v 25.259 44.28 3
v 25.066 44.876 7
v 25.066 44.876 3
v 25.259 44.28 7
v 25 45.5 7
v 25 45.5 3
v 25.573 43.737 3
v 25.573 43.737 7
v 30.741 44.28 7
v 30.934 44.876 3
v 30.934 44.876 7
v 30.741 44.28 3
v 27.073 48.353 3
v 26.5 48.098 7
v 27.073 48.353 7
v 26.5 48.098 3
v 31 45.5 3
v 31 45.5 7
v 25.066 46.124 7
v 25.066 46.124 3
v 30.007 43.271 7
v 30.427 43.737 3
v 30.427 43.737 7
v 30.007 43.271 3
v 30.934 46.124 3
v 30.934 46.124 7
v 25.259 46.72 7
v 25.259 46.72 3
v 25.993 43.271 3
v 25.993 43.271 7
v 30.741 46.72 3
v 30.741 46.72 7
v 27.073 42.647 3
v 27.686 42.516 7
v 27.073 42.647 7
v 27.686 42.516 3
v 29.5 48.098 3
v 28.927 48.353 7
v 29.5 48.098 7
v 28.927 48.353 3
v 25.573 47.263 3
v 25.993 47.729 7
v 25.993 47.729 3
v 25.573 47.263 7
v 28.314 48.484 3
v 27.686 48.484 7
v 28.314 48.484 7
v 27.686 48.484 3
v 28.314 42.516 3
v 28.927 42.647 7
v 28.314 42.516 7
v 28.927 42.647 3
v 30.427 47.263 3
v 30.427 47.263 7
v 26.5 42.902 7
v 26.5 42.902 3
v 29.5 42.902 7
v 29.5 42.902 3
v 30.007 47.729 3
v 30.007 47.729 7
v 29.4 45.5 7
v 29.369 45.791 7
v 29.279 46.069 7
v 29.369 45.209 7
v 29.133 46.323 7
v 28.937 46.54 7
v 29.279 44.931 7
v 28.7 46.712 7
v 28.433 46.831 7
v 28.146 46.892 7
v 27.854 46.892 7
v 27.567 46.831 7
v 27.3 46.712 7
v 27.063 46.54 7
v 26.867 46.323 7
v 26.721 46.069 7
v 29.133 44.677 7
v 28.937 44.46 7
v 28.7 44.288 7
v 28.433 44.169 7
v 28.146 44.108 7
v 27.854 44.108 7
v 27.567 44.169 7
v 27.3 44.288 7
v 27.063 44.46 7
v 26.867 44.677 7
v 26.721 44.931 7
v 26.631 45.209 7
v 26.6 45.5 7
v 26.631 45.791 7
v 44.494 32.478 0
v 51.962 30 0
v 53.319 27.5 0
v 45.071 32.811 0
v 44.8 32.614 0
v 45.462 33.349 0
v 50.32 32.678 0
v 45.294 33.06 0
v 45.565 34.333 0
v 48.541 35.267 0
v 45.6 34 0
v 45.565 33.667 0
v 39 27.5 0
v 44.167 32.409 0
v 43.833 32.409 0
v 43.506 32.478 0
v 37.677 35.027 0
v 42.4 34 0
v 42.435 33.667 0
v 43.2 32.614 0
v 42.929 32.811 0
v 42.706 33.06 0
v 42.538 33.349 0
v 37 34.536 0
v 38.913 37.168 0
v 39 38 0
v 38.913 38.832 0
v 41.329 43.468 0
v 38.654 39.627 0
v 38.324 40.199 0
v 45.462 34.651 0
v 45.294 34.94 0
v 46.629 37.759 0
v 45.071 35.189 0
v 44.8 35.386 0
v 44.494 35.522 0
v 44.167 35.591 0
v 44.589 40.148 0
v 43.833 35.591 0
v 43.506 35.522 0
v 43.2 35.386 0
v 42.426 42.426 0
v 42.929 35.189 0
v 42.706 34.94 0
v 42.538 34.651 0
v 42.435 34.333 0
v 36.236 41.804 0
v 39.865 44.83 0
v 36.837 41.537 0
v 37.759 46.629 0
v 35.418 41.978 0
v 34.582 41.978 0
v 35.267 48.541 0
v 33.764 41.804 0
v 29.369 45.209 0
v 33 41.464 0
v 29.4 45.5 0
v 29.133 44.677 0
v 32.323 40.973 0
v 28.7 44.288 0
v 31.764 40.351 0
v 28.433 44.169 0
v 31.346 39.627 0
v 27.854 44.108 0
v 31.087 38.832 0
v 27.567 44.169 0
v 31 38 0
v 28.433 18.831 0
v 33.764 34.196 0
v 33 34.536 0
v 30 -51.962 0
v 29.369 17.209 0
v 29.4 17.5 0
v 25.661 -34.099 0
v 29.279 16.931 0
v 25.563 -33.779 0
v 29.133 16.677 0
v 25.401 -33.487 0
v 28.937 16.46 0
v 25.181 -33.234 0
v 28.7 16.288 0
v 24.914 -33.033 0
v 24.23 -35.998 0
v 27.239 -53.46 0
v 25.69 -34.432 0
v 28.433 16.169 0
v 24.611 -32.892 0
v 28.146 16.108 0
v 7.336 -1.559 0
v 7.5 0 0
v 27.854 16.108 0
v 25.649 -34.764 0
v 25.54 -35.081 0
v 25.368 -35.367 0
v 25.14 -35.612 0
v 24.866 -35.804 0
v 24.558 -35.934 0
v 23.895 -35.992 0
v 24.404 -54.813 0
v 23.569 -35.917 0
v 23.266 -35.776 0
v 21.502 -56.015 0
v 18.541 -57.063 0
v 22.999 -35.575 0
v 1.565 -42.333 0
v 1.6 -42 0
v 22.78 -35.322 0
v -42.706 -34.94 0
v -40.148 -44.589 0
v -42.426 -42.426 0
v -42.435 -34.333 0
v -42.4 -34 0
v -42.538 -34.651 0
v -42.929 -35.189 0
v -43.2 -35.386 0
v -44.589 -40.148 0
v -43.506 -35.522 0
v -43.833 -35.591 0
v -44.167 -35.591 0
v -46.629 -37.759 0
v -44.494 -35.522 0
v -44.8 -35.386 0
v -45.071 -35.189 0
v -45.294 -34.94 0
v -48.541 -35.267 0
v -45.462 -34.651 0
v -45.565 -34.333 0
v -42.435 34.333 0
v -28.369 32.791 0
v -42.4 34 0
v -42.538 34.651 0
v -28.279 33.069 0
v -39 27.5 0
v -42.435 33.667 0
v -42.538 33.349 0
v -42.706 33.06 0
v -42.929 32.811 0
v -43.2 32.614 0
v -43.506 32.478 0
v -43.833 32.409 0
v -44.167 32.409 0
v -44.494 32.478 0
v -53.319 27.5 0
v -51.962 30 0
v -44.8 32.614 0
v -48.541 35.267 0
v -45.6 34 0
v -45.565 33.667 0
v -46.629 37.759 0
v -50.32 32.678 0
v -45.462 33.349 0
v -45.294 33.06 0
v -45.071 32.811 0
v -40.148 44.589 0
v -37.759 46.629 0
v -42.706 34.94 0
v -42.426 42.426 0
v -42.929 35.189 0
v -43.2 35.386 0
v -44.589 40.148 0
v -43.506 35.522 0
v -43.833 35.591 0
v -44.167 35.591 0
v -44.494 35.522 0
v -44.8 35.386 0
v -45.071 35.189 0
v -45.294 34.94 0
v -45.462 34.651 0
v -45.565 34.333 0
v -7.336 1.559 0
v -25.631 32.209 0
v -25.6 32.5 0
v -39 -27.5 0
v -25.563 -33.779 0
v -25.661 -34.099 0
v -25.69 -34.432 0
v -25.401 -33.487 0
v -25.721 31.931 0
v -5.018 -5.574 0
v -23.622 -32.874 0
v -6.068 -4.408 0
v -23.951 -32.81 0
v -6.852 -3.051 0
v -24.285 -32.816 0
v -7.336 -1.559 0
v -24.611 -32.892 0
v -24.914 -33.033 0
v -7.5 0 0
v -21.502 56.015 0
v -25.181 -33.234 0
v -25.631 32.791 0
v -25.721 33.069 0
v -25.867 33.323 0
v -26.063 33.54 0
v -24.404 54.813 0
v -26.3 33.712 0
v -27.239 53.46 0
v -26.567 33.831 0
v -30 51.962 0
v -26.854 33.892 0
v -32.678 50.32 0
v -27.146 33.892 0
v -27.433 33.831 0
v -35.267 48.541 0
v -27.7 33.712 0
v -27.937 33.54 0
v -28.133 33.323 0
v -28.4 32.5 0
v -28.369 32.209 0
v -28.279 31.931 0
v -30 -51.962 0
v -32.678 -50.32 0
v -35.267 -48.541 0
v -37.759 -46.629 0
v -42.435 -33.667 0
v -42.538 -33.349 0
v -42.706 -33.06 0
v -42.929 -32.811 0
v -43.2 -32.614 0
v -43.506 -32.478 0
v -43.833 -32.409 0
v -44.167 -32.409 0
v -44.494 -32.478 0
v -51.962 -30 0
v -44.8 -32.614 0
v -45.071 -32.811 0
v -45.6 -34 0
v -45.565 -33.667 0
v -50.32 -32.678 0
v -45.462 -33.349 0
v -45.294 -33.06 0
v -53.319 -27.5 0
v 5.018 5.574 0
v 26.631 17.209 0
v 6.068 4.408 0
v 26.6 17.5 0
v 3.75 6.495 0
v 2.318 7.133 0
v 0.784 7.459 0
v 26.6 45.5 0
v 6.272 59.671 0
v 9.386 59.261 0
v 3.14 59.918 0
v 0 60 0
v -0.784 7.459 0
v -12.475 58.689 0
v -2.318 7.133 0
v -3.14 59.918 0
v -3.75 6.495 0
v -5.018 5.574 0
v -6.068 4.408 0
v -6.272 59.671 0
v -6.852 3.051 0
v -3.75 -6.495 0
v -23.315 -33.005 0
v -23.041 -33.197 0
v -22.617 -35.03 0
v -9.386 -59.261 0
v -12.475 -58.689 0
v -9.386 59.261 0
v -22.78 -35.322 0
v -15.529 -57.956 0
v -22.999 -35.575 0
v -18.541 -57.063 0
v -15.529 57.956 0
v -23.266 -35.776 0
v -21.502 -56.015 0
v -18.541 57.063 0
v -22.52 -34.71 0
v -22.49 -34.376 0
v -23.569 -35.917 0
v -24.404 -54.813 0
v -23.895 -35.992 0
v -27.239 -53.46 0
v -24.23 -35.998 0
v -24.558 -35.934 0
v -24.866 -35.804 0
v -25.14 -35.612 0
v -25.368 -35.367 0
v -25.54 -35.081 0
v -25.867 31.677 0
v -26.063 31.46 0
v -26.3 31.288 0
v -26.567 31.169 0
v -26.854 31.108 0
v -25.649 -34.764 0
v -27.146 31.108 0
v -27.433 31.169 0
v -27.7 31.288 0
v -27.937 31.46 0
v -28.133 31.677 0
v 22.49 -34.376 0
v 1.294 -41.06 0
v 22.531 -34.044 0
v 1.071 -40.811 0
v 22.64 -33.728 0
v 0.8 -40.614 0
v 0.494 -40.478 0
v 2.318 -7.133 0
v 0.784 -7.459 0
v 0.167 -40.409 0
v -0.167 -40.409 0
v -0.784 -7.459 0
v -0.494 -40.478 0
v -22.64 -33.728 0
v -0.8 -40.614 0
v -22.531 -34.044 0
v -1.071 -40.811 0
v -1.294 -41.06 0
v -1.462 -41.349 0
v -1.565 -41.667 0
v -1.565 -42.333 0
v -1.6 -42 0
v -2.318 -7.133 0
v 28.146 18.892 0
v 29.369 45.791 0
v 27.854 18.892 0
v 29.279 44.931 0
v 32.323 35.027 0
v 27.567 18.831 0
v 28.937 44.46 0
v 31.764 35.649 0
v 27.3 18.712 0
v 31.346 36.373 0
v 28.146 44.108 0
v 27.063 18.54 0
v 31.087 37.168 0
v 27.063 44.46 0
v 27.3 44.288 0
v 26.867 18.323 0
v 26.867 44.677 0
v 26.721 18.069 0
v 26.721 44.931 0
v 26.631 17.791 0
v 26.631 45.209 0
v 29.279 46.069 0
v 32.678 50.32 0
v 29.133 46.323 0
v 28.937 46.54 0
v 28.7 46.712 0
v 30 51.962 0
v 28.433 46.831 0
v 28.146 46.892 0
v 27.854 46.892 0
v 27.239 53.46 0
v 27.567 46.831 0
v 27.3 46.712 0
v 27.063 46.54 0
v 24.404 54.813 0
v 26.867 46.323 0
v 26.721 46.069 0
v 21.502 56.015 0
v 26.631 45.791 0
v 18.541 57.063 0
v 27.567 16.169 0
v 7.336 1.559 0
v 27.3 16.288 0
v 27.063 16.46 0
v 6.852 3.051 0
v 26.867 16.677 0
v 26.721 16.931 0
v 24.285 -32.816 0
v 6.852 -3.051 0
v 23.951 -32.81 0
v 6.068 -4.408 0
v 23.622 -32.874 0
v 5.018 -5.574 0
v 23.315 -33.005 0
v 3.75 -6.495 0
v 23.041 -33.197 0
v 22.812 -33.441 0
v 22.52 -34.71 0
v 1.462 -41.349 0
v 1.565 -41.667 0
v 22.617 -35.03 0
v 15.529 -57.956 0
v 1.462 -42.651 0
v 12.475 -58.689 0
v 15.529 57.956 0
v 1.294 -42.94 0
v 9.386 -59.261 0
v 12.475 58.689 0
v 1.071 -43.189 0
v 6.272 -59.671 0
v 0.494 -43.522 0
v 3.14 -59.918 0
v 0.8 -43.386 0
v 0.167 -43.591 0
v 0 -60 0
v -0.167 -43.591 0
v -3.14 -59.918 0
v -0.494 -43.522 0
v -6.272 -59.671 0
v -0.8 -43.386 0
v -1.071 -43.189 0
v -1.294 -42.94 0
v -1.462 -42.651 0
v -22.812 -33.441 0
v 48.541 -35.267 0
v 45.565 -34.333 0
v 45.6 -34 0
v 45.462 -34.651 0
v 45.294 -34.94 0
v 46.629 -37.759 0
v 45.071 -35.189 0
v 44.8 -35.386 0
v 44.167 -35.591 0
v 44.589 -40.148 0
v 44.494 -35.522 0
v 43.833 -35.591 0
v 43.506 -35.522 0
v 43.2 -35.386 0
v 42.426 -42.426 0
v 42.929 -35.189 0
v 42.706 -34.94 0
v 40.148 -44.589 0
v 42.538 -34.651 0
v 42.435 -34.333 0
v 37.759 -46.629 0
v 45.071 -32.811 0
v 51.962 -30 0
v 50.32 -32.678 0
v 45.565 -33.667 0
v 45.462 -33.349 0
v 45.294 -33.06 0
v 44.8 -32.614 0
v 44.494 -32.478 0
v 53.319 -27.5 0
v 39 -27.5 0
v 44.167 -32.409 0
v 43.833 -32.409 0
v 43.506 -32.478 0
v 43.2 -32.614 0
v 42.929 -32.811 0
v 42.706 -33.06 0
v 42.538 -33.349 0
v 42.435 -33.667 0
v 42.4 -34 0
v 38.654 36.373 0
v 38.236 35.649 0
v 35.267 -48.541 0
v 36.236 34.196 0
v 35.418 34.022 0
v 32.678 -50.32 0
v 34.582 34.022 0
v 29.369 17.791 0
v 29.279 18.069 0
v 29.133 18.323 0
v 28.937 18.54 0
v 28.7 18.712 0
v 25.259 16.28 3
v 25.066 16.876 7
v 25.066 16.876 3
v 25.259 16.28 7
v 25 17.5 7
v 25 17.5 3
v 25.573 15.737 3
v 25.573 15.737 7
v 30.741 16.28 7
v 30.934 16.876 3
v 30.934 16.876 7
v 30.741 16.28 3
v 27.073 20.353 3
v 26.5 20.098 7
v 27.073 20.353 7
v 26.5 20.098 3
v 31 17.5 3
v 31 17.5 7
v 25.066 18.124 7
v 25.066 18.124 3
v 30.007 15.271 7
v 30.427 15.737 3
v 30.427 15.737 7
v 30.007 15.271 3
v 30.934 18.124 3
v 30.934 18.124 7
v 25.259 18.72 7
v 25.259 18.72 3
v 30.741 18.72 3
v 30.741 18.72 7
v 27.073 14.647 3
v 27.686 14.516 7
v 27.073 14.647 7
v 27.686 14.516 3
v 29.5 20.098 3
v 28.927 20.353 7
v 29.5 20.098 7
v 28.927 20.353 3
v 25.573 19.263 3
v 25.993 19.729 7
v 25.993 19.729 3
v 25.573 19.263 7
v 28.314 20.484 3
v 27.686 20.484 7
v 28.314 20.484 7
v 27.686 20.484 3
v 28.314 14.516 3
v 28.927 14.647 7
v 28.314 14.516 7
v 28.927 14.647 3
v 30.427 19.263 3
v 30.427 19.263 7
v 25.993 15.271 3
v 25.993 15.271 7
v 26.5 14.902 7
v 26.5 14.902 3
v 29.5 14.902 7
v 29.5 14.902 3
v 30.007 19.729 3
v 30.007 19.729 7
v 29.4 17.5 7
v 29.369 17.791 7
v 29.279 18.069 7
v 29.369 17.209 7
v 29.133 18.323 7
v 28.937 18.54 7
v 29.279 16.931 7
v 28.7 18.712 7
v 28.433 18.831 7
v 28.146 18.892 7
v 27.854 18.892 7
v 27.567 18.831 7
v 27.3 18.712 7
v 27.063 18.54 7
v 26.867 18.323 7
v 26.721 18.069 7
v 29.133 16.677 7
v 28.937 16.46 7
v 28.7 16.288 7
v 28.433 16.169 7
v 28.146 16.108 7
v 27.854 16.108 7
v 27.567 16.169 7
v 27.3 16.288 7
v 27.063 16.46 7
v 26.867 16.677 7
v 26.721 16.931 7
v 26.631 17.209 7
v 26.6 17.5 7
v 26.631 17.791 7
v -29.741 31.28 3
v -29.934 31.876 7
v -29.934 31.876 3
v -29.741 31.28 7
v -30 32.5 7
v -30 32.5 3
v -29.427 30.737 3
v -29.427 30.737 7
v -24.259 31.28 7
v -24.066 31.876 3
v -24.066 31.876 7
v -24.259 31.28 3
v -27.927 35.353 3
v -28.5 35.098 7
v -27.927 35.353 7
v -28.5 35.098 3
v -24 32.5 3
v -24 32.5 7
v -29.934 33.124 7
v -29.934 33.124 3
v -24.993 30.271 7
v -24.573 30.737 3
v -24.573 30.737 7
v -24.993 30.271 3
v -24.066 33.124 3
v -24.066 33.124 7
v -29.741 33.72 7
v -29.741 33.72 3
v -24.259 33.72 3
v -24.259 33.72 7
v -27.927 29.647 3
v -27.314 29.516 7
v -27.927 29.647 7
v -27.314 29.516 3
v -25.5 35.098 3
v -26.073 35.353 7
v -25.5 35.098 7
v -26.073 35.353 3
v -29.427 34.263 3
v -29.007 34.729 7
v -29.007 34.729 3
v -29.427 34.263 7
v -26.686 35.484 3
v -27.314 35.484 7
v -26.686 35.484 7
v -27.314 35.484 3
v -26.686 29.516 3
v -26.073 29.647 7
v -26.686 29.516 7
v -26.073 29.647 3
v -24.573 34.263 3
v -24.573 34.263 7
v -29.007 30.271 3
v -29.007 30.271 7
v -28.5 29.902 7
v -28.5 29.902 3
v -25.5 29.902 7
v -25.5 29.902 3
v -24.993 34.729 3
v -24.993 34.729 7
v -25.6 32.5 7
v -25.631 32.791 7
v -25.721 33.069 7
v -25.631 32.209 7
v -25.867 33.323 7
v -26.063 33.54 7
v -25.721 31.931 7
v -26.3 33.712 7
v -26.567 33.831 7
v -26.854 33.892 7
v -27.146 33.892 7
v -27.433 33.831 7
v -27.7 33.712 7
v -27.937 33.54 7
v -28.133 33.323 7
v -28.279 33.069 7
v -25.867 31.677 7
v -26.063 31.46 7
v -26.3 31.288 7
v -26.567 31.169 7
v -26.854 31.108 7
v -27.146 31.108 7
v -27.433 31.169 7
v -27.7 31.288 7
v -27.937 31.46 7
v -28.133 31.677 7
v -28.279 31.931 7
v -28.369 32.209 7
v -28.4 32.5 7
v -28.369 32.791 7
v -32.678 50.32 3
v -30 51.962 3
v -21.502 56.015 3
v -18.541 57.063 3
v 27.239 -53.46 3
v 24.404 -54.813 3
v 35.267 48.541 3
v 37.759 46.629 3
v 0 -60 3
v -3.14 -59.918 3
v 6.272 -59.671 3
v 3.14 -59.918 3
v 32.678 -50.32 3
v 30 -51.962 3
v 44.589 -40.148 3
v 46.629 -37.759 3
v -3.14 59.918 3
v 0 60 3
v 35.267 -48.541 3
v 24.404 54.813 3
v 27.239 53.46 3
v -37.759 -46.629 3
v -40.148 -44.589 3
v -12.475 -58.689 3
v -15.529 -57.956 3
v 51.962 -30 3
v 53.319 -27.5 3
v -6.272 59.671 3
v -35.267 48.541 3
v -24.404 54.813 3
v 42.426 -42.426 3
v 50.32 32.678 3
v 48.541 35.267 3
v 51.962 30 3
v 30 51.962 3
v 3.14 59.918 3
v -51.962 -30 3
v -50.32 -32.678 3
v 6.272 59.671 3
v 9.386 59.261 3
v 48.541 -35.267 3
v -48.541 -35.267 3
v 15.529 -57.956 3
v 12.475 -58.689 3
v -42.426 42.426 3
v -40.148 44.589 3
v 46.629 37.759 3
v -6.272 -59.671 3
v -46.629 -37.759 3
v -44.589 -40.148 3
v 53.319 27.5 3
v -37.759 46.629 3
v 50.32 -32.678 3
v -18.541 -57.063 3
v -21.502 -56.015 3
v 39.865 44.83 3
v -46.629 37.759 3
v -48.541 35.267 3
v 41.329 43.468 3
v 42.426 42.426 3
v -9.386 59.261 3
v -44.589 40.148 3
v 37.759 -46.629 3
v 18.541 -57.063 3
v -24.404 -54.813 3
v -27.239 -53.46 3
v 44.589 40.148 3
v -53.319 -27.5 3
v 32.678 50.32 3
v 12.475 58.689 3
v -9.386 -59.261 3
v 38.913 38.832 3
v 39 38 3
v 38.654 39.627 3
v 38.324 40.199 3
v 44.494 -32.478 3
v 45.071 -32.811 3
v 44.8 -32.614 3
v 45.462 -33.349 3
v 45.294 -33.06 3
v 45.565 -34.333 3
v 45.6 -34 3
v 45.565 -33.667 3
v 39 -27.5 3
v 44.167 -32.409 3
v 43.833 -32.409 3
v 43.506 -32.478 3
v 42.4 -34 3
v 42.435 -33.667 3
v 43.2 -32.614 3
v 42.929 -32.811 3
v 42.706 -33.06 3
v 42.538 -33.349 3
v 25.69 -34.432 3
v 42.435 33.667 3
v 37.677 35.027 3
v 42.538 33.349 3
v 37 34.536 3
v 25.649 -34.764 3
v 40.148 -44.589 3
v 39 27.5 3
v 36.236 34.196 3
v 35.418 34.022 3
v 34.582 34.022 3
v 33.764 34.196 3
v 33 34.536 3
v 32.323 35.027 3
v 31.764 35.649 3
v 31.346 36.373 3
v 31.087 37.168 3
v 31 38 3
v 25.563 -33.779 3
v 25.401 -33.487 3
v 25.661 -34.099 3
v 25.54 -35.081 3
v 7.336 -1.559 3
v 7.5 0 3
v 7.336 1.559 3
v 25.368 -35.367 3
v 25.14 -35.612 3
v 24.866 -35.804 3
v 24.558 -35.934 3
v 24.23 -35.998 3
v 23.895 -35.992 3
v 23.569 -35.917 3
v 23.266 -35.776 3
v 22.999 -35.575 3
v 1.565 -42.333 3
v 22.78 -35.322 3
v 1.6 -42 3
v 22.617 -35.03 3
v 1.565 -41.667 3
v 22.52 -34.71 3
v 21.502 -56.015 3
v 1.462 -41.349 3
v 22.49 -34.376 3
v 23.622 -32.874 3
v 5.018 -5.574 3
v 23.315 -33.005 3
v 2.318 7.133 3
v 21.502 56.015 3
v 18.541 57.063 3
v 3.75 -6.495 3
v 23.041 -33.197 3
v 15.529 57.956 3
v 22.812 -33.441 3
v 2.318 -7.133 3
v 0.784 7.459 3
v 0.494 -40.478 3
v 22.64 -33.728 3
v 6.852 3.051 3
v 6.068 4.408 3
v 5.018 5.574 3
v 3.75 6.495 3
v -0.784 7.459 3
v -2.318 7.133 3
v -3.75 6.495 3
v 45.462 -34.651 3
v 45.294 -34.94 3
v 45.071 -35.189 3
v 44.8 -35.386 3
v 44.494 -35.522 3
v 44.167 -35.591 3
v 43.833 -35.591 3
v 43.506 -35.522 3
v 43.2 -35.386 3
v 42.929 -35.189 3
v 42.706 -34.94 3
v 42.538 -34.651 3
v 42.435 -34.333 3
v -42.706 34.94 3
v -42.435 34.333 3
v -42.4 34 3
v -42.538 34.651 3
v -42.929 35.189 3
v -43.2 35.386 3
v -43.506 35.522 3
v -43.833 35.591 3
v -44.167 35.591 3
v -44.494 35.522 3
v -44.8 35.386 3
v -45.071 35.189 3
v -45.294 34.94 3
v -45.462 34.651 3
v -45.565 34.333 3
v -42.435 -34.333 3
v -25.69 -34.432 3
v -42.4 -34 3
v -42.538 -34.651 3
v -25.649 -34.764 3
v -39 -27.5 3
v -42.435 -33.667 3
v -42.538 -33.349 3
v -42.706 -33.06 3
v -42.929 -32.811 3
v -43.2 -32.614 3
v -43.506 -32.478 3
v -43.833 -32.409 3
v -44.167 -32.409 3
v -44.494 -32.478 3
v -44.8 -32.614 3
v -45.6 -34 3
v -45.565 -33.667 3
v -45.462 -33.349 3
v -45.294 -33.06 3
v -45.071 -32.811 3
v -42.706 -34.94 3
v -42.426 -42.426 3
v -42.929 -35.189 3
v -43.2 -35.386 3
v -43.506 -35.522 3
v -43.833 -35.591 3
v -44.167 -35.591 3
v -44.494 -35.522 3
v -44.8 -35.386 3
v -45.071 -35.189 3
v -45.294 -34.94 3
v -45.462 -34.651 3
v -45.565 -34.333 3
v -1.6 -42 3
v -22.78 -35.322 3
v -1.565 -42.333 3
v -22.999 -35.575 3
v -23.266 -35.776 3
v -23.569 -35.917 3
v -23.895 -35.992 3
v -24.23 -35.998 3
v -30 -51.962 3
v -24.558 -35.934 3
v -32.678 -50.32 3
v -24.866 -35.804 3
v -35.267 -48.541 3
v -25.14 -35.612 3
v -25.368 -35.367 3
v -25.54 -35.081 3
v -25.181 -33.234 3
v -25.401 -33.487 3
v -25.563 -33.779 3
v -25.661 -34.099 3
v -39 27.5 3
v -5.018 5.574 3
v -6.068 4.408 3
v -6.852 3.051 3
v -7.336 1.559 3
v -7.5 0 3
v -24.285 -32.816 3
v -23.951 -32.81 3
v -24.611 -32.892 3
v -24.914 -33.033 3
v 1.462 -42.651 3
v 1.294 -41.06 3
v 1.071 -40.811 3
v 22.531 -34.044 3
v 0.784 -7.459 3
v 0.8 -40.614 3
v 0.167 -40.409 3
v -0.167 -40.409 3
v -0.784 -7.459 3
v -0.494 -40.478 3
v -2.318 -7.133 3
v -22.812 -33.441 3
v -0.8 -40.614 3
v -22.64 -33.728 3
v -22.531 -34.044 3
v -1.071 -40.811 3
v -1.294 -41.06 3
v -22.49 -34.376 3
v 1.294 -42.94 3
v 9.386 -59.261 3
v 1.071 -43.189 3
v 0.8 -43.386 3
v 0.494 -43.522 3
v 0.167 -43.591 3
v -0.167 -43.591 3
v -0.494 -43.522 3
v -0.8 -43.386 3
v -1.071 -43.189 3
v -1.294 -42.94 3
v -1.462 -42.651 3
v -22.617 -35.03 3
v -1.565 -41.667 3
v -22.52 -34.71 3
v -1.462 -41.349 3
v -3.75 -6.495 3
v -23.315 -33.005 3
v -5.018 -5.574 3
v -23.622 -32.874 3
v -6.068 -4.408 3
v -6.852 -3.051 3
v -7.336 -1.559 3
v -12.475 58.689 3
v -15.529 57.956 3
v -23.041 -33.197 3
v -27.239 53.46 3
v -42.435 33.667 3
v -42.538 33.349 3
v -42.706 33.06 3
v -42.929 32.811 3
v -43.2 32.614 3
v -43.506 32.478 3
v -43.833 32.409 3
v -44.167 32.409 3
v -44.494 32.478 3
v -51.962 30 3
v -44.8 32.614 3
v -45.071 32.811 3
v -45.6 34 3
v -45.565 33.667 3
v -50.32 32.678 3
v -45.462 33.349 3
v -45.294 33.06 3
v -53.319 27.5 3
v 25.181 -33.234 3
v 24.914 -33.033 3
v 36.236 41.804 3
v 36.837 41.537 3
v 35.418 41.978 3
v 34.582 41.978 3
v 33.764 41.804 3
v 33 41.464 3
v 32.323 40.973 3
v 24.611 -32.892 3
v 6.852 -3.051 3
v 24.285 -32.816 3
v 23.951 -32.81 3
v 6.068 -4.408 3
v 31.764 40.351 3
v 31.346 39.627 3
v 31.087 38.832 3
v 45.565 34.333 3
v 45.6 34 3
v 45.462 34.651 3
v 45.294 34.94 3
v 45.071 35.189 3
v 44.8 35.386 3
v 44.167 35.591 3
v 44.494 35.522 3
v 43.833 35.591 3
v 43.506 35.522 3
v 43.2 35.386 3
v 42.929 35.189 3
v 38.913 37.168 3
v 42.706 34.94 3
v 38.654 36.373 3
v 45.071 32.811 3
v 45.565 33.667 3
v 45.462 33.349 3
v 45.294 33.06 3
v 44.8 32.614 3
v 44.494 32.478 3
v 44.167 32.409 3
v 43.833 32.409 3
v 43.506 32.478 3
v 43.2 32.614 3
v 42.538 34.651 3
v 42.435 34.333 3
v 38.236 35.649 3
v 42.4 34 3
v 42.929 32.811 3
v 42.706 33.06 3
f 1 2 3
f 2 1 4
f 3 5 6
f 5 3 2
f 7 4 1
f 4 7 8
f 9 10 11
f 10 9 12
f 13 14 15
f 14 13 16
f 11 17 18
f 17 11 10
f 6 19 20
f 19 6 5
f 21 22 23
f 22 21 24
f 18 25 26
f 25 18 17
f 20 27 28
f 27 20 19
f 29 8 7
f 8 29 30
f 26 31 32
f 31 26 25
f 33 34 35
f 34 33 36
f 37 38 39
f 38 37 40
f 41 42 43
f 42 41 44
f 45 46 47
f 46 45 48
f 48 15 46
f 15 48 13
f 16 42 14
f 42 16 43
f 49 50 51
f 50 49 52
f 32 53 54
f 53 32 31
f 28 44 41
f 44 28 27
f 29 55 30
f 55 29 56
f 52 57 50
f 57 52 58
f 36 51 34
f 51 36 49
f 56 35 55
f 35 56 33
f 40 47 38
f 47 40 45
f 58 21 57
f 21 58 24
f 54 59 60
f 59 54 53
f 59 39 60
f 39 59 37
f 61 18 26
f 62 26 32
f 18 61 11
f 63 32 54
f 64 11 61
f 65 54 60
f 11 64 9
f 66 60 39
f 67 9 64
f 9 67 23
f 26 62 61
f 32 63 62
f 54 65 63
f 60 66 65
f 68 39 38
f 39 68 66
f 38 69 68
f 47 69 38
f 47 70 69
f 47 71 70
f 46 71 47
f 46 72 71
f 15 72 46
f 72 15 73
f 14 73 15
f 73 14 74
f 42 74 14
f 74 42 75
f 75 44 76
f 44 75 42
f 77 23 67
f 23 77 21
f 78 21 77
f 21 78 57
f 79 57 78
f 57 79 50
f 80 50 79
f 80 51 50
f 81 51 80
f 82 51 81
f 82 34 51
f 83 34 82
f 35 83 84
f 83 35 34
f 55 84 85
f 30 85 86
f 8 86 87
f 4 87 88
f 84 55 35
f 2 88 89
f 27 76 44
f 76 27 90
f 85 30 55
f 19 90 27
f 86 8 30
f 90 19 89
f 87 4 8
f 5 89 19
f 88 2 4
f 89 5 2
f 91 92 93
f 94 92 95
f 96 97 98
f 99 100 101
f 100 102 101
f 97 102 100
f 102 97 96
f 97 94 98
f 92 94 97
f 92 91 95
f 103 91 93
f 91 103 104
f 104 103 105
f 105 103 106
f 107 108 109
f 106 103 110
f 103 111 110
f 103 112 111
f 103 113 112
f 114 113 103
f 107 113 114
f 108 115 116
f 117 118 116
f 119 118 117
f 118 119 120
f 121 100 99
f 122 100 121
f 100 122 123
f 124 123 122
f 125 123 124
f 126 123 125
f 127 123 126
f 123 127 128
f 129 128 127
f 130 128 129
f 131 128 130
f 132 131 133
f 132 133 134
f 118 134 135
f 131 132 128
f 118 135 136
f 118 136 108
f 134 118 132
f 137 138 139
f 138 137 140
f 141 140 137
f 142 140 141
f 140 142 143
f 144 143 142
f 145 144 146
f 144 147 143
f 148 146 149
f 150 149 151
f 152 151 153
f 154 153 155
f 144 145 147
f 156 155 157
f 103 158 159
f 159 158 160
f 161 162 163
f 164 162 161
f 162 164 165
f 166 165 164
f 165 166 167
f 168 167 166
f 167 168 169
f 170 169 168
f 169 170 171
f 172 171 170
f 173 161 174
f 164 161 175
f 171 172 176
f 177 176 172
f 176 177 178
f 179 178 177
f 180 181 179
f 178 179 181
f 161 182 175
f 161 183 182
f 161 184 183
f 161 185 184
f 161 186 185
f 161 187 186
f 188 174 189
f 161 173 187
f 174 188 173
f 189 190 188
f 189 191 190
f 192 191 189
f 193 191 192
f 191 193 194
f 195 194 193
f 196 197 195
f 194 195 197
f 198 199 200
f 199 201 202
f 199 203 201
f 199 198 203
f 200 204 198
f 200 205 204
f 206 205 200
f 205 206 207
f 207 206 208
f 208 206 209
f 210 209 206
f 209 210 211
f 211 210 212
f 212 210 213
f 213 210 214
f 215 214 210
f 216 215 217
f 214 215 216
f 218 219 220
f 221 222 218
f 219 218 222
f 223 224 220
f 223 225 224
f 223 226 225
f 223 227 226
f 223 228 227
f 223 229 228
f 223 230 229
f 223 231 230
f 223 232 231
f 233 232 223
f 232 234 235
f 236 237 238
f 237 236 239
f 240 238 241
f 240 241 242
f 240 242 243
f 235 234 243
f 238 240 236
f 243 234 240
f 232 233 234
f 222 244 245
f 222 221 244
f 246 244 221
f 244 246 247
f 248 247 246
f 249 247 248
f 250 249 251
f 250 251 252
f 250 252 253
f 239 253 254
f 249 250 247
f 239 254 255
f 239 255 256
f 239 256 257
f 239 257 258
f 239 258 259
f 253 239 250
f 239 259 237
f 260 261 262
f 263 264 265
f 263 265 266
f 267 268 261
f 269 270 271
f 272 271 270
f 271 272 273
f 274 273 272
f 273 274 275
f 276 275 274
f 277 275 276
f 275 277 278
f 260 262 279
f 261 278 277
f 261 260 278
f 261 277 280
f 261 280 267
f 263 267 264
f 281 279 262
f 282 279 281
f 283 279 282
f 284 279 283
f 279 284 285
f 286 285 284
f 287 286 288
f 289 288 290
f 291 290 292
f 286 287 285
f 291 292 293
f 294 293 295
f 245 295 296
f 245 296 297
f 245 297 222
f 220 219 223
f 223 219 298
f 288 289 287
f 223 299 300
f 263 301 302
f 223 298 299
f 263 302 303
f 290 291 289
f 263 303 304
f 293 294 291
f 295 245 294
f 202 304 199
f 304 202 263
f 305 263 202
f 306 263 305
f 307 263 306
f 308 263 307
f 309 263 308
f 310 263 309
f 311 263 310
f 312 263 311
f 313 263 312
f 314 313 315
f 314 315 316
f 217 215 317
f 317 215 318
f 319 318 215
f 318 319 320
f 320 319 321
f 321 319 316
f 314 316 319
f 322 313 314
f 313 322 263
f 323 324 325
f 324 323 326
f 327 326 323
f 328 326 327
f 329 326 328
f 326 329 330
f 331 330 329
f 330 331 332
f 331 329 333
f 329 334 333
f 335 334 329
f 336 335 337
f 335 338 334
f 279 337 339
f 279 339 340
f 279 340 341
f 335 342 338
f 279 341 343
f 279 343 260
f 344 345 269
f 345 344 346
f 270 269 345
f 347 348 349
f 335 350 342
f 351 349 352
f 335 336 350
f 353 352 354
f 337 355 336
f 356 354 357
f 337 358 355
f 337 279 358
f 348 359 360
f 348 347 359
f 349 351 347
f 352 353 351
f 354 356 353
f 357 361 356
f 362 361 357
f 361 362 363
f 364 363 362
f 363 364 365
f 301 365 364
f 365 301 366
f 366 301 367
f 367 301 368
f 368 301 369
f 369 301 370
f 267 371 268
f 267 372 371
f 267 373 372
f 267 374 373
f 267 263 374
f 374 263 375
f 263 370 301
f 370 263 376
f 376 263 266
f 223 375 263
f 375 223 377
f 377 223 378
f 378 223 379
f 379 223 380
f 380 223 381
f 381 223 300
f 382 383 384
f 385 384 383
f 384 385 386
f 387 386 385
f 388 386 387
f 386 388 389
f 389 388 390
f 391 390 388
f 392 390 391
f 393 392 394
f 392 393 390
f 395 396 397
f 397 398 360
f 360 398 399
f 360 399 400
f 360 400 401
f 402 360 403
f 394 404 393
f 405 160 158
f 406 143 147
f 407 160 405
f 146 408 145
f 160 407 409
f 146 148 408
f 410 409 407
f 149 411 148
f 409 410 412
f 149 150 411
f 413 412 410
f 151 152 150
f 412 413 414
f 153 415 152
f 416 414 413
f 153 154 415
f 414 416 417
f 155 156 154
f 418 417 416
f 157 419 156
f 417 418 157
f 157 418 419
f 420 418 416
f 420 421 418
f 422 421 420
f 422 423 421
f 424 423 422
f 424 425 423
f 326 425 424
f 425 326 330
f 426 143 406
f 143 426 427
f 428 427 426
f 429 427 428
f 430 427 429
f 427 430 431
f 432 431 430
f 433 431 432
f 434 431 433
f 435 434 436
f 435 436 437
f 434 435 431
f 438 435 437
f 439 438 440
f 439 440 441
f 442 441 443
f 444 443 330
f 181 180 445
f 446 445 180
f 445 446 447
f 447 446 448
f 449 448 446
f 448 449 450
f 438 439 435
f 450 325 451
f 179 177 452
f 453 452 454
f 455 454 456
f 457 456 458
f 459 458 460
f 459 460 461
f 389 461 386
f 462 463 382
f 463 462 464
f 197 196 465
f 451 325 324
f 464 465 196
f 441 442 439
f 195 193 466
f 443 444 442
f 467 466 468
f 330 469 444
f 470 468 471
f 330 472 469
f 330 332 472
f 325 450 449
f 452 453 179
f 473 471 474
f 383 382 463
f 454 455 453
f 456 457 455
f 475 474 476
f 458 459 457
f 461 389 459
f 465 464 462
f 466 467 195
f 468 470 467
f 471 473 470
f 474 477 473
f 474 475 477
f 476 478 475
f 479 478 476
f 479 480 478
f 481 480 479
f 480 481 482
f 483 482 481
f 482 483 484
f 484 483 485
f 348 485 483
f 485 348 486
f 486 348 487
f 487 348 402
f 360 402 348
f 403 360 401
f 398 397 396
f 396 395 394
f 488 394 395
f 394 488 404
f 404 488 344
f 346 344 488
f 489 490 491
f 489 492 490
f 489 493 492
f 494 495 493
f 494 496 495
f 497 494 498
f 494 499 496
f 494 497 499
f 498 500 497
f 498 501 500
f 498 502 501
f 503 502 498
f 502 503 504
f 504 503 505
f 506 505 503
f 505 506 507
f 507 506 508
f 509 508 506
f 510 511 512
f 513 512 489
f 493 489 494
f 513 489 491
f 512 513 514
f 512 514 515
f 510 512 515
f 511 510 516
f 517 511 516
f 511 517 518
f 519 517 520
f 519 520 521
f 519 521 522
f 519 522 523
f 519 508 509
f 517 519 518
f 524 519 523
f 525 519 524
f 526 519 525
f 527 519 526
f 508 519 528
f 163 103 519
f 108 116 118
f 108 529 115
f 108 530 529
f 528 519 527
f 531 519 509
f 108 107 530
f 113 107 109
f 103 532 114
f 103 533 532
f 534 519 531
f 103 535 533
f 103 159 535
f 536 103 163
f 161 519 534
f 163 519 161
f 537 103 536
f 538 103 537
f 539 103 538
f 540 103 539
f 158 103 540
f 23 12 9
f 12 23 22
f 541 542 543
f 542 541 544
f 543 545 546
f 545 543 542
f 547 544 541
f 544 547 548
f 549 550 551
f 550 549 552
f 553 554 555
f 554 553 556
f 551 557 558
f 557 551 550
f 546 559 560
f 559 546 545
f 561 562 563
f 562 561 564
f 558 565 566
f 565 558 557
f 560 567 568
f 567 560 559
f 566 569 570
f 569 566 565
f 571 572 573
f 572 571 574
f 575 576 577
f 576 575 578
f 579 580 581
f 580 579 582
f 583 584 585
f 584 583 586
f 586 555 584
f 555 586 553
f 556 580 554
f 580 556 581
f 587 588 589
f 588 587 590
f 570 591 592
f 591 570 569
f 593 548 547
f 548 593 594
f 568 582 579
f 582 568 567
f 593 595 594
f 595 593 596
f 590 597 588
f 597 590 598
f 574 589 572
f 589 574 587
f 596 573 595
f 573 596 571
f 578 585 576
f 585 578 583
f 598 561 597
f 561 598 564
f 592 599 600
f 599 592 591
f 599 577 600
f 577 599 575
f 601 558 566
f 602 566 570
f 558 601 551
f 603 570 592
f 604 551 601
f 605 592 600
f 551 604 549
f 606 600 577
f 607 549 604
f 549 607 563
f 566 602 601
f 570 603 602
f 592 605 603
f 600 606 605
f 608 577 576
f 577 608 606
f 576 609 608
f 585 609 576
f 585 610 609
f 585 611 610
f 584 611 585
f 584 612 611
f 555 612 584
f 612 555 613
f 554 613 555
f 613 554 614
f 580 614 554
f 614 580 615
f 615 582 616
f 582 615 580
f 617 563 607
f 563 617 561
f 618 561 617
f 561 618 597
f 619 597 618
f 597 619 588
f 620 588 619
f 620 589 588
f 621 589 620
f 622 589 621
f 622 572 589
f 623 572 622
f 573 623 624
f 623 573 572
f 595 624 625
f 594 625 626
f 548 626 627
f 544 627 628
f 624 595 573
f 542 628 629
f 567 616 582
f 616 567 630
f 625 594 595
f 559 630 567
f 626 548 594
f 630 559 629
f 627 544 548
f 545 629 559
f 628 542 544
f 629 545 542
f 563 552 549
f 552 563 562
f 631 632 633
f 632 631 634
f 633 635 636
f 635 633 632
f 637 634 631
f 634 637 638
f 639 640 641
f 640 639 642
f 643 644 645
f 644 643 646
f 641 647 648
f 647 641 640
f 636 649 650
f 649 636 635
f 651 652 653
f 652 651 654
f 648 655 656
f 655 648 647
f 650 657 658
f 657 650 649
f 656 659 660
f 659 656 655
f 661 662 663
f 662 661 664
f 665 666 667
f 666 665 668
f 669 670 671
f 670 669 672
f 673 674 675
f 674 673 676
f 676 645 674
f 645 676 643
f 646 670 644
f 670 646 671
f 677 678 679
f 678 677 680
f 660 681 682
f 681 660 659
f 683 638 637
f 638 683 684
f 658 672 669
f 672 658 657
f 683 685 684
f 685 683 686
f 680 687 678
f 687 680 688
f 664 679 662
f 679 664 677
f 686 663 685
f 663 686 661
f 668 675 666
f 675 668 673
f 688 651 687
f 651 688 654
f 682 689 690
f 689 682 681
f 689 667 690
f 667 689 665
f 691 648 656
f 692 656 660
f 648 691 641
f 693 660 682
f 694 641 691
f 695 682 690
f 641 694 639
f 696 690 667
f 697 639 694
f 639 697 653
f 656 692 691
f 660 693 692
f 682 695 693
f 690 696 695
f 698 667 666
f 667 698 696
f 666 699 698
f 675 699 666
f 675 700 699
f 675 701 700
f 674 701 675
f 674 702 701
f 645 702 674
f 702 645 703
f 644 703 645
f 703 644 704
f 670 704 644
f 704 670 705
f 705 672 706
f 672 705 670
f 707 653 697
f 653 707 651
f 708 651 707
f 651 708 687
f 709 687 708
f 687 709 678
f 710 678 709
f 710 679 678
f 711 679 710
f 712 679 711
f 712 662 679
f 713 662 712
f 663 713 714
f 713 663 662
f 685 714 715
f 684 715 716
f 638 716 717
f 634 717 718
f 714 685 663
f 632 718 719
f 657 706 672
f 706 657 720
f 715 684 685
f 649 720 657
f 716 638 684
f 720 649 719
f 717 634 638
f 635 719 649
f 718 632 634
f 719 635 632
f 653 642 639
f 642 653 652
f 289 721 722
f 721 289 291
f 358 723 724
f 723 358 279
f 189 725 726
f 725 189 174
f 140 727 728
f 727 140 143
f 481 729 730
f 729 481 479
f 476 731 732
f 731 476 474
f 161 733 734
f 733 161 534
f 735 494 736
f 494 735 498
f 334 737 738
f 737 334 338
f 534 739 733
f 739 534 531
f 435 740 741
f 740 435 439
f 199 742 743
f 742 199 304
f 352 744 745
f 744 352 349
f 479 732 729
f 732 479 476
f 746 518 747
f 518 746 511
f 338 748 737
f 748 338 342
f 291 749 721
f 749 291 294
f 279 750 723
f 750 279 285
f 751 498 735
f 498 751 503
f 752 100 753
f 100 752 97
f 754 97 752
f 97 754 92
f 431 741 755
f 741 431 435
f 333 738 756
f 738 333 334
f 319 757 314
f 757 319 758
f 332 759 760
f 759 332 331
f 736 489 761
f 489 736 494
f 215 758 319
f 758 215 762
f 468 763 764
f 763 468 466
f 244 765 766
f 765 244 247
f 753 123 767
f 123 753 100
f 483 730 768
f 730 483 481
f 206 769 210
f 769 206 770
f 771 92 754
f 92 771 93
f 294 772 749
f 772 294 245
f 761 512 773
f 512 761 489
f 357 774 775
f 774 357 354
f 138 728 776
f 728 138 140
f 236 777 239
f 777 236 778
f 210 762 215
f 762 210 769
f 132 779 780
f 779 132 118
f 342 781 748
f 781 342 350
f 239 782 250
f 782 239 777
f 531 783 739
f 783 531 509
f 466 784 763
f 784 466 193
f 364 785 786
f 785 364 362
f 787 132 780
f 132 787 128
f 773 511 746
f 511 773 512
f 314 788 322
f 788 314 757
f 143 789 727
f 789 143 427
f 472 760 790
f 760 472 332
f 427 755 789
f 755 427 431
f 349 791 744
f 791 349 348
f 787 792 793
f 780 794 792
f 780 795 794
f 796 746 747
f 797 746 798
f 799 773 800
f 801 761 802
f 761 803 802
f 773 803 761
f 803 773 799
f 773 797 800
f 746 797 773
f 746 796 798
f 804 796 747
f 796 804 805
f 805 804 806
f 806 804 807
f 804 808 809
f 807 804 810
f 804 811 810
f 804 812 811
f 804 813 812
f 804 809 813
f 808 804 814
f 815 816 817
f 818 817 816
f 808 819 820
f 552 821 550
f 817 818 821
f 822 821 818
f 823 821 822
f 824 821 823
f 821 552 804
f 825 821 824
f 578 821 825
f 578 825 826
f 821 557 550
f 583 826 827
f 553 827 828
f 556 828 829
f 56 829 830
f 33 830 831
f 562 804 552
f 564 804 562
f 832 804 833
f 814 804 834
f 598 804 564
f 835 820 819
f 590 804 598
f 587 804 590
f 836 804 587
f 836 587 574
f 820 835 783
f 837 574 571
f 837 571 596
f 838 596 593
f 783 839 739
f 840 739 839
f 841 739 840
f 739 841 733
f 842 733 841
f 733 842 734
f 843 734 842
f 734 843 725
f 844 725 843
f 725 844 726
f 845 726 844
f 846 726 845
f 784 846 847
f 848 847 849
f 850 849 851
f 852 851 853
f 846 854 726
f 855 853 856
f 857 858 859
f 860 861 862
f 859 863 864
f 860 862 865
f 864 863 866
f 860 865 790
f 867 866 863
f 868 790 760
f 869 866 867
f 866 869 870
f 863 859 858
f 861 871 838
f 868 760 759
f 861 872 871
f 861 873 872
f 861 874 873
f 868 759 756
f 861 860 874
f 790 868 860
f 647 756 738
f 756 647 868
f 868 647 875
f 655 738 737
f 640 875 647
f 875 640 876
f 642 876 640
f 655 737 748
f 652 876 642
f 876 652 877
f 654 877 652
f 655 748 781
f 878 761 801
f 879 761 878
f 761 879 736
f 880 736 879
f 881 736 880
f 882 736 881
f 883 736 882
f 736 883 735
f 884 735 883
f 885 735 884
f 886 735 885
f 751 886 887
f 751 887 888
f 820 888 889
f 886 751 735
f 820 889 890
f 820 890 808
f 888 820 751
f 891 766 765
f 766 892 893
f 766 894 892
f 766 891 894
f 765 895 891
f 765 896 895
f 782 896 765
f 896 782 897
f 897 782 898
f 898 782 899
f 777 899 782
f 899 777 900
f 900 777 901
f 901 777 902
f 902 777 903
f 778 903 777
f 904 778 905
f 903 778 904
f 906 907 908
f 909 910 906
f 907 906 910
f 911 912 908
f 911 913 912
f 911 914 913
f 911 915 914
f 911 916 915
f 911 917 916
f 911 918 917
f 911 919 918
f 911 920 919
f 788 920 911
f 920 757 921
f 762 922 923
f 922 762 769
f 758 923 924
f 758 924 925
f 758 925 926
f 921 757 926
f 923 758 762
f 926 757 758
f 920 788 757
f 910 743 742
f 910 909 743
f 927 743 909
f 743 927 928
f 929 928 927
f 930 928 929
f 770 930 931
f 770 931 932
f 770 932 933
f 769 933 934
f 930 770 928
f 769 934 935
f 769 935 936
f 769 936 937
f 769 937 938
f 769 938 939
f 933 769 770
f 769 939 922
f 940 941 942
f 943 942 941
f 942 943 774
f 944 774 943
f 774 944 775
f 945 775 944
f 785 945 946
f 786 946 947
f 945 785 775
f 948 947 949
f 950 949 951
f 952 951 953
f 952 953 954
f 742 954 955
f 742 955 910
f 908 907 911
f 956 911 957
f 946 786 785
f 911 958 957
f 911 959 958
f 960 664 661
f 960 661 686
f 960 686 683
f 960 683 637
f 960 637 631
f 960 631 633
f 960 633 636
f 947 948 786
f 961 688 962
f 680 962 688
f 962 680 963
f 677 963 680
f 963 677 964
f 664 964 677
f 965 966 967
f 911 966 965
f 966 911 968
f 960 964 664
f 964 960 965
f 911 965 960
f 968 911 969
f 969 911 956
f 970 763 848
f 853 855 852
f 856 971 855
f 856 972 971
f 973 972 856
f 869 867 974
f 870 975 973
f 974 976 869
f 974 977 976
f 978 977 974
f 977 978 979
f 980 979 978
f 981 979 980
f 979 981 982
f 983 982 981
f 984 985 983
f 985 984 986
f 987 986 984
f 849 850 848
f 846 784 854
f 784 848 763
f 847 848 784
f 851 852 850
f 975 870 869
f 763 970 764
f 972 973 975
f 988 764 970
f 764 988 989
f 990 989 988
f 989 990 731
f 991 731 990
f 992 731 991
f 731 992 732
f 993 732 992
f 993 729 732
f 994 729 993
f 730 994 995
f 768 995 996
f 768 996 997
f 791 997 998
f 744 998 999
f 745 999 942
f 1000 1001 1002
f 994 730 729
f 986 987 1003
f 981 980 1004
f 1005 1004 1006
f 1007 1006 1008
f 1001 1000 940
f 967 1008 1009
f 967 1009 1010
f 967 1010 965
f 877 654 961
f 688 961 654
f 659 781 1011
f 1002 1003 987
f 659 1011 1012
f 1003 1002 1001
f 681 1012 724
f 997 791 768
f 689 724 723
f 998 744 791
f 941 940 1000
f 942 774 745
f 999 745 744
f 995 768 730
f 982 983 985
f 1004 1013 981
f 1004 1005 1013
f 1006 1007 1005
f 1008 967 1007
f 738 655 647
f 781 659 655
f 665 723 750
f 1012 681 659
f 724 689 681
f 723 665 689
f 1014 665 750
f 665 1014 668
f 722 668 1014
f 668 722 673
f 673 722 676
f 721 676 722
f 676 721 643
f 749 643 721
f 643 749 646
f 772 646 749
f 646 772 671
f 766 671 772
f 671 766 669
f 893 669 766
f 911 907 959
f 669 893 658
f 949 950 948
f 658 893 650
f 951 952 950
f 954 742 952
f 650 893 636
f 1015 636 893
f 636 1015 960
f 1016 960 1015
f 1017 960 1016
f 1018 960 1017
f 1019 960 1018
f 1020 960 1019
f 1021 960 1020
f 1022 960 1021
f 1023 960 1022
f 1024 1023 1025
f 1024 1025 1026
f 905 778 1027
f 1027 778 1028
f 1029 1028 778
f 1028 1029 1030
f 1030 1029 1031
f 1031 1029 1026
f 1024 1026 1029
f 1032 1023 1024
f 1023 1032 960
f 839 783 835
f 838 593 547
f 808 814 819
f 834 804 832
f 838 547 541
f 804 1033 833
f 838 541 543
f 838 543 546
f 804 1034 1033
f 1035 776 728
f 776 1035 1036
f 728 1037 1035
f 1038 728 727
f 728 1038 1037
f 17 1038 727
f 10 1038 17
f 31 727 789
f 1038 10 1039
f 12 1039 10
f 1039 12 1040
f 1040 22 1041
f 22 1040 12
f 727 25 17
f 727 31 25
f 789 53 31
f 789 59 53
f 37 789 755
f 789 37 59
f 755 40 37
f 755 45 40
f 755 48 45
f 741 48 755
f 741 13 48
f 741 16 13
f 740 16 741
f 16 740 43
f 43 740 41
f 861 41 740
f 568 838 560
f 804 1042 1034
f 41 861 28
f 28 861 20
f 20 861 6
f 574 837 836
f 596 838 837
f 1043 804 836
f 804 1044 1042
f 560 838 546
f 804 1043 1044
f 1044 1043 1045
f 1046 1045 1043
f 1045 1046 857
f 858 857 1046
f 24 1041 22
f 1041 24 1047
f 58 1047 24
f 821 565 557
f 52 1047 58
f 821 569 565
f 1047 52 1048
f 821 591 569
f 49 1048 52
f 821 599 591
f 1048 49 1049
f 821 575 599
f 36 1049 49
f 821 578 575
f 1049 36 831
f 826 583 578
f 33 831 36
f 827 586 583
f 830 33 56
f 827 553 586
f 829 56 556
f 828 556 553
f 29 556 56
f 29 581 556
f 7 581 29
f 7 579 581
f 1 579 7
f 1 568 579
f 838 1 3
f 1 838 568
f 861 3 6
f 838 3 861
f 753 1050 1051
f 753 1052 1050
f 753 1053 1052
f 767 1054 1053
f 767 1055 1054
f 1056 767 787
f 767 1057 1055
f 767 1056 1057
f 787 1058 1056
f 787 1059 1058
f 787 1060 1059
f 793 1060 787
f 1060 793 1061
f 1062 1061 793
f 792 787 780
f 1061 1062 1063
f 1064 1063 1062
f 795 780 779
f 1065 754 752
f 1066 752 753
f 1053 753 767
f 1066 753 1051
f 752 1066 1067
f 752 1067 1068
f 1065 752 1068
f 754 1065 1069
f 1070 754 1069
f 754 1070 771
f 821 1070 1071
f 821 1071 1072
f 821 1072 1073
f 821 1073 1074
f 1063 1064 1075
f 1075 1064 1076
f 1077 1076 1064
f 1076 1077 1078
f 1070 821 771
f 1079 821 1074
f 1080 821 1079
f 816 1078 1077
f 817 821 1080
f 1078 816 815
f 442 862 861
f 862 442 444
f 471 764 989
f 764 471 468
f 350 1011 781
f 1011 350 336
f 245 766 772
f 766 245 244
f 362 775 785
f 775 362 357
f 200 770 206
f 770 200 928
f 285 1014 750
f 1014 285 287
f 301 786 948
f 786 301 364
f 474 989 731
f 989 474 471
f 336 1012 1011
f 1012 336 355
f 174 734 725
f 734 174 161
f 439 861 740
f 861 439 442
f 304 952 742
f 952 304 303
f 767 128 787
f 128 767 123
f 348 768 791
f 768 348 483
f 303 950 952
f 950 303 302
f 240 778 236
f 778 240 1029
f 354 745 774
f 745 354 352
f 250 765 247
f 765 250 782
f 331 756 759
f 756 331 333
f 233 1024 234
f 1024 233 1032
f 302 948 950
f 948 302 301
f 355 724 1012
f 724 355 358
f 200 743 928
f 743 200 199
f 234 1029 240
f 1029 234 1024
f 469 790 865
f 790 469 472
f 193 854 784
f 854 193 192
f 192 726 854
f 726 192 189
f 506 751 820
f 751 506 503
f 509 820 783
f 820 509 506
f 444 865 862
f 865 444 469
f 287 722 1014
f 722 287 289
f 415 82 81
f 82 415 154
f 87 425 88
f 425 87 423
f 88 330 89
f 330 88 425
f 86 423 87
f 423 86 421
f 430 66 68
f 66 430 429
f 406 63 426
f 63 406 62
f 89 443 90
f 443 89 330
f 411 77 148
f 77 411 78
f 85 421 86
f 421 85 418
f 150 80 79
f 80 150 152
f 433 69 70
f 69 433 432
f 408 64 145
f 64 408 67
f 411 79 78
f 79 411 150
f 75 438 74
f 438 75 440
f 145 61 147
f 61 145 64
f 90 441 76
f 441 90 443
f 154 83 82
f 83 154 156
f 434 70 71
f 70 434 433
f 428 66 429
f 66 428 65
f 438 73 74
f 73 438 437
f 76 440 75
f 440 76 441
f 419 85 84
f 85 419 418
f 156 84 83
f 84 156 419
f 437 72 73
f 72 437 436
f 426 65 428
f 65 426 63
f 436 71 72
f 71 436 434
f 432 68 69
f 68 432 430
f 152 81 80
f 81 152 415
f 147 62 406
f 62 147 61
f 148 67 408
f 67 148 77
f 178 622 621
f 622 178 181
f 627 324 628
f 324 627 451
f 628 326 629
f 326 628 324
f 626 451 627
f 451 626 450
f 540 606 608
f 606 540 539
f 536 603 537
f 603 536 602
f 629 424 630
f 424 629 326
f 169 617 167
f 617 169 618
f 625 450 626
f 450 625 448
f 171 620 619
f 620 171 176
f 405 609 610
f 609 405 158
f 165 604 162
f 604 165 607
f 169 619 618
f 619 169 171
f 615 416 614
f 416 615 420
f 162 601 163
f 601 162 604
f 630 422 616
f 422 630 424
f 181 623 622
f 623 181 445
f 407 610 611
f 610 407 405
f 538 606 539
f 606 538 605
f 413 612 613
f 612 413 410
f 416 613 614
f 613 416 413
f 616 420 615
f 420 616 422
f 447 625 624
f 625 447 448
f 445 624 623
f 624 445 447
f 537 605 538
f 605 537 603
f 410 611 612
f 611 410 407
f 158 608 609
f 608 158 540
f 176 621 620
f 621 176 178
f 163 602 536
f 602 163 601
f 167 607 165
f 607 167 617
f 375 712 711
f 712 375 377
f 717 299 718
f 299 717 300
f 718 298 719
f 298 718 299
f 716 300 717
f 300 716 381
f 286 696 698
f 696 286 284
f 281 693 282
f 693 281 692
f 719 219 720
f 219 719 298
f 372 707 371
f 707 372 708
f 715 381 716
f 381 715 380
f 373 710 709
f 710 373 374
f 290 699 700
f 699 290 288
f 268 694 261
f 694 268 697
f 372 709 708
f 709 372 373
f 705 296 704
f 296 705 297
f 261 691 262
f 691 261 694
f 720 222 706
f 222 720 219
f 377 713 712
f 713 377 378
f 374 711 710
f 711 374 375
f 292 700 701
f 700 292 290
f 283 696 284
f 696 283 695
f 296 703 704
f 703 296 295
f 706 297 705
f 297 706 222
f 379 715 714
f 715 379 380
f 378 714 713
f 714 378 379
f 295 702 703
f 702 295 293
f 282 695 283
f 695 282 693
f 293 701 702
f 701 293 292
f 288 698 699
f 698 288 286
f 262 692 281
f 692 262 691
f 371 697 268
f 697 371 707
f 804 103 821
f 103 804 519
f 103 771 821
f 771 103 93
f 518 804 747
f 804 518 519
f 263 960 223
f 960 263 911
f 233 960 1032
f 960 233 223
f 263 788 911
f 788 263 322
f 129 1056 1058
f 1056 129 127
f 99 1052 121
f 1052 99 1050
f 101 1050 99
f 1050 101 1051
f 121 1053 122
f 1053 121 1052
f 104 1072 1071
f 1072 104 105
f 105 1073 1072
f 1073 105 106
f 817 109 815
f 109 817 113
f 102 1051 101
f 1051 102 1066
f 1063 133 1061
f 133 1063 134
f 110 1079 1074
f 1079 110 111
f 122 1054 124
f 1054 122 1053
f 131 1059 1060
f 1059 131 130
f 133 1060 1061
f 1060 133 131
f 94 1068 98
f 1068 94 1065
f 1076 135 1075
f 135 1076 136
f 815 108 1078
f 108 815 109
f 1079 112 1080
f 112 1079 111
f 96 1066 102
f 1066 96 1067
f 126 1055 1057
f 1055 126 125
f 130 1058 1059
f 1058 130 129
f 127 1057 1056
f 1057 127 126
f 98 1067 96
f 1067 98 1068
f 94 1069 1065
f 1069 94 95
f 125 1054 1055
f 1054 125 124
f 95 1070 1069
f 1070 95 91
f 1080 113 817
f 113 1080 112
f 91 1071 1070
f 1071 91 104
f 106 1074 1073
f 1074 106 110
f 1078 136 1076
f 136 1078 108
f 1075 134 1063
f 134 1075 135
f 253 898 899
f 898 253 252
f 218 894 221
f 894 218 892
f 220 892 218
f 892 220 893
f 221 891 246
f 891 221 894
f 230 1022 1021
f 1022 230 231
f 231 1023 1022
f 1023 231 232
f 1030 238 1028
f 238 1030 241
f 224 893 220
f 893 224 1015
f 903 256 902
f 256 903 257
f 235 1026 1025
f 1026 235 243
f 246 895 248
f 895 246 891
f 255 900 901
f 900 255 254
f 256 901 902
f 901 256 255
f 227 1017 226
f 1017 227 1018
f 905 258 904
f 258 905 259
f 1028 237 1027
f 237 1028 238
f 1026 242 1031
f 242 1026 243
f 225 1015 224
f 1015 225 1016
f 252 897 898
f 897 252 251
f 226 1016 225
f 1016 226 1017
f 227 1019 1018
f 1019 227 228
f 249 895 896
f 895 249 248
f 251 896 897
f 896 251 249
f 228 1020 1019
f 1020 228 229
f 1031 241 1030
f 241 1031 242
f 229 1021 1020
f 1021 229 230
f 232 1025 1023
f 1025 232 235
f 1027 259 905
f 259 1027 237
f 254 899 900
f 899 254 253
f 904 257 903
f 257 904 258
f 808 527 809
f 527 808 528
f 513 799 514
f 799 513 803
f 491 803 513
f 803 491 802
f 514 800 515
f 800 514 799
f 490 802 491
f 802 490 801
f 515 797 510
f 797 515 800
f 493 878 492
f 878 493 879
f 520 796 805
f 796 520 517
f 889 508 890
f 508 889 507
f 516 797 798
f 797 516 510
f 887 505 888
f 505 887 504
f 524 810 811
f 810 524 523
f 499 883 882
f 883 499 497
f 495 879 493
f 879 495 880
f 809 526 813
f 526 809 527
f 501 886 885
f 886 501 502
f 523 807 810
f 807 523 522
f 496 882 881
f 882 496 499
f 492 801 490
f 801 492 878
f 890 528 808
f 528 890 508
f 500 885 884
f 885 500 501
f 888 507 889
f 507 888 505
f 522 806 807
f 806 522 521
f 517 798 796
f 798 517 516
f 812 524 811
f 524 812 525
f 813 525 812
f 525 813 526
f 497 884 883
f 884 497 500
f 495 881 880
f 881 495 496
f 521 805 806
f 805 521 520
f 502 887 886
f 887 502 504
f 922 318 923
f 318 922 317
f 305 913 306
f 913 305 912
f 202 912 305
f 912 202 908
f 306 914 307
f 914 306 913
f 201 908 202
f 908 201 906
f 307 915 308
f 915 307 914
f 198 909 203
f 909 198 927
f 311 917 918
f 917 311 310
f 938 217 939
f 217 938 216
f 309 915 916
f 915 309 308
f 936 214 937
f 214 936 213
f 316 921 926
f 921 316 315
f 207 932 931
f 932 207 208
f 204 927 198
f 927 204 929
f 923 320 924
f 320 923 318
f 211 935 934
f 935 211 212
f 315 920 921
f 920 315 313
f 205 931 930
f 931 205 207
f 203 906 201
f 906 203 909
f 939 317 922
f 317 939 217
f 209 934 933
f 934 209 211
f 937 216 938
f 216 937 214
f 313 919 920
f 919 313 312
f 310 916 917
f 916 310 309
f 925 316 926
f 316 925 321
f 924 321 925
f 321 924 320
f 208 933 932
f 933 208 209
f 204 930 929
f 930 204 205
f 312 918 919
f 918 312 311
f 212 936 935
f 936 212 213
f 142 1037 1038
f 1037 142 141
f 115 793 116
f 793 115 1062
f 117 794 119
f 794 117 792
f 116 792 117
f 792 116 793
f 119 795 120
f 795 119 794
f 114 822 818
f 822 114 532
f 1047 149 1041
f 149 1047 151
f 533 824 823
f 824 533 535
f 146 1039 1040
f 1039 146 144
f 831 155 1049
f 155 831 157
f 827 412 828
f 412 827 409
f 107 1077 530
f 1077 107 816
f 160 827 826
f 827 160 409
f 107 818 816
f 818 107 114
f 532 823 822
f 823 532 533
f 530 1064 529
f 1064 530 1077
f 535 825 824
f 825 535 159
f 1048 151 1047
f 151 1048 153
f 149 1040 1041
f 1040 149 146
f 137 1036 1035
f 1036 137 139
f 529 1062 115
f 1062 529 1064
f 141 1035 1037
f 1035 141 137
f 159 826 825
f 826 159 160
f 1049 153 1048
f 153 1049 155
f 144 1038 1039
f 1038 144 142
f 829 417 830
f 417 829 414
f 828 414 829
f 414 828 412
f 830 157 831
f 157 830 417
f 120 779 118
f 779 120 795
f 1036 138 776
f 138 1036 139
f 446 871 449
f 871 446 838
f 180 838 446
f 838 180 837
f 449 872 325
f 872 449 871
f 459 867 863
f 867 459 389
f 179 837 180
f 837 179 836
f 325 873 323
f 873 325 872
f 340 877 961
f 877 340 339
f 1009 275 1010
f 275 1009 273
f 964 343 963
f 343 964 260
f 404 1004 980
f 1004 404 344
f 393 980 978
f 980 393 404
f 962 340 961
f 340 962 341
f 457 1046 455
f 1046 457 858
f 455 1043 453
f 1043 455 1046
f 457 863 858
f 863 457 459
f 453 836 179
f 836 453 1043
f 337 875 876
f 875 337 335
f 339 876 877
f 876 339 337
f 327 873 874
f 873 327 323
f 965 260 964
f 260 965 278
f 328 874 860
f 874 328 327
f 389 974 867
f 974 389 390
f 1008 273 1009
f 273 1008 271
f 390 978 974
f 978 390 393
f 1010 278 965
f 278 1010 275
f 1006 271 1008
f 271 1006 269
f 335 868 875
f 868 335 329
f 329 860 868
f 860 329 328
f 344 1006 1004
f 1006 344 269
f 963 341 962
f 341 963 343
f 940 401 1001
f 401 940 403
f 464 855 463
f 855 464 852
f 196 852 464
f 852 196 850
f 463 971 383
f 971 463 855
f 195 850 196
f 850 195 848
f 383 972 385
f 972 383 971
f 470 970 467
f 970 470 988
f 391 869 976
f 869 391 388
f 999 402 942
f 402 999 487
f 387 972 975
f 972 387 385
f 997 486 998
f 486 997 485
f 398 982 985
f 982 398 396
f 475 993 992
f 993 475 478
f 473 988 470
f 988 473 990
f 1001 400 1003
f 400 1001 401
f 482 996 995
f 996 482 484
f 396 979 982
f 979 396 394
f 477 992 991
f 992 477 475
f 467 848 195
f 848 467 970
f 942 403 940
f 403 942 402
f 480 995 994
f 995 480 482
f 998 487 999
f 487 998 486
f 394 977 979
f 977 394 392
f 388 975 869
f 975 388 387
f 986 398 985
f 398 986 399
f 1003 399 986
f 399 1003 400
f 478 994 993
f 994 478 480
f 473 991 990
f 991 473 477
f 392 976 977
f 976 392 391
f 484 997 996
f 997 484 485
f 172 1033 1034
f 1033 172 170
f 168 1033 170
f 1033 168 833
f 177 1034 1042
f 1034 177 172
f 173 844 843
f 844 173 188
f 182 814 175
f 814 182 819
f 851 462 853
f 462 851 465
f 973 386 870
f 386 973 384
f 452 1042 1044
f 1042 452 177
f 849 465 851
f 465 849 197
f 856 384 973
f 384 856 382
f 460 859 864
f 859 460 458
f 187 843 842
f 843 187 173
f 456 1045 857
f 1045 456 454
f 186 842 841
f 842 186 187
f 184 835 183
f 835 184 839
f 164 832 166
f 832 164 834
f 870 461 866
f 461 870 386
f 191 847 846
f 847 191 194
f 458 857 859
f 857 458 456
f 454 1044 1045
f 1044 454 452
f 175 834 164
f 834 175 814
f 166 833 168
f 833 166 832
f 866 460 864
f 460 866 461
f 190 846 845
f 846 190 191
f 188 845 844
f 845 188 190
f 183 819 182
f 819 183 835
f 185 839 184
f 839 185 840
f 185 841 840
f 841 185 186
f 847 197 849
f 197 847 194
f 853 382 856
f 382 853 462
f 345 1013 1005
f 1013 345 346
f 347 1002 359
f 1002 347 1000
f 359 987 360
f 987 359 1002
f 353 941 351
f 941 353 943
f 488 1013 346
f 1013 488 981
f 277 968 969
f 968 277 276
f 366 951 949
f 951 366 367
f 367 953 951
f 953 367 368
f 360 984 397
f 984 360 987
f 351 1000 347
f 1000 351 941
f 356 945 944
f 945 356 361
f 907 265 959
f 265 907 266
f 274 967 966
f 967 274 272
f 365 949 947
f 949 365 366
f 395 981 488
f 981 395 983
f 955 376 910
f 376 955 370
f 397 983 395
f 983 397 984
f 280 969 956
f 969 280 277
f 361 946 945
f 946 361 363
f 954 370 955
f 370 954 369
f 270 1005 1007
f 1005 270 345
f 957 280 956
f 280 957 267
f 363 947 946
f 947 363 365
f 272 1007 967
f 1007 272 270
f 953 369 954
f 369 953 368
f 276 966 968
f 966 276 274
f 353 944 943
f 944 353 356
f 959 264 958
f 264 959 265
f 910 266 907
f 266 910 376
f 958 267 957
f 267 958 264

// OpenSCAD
$fn=30;

difference(){

union(){
cylinder(d=120,h=3,$fn=120);
translate([31.5,49])rotate([0,0,180]){    
translate([3.5,3.5,0])cylinder(d=6,h=7);
translate([3.5,31.5,0])cylinder(d=6,h=7);
translate([58.5,16.5,0])cylinder(d=6,h=7);
}
}

translate([39,-27.5,-1])cube(55);
scale([-1,1,1])translate([39,-27.5,-1])cube(55);

translate([44,34,-1])cylinder(d=3.2,h=5);    
translate([-44,34,-1])cylinder(d=3.2,h=5);    
translate([44,-34,-1])cylinder(d=3.2,h=5);    
translate([-44,-34,-1])cylinder(d=3.2,h=5);

translate([35,38,-1])cylinder(d=8,h=5);    

rotate([0,0,-42.6])
translate([-1,53,-1])cube([2,8,5]);

translate([0,0,-1])cylinder(d=15,h=5);

translate([0,-42,-1])cylinder(d=3.2,h=5);
rotate([0,0,35])translate([0,-42,-1])cylinder(d=3.2,h=5);    
rotate([0,0,-35])translate([0,-42,-1])cylinder(d=3.2,h=5);  

translate([31.5,49])rotate([0,0,180]){
translate([3.5,3.5,-1])cylinder(d=2.8,h=9);
translate([3.5,31.5,-1])cylinder(d=2.8,h=9);
translate([58.5,16.5,-1])cylinder(d=2.8,h=9);
}
}
